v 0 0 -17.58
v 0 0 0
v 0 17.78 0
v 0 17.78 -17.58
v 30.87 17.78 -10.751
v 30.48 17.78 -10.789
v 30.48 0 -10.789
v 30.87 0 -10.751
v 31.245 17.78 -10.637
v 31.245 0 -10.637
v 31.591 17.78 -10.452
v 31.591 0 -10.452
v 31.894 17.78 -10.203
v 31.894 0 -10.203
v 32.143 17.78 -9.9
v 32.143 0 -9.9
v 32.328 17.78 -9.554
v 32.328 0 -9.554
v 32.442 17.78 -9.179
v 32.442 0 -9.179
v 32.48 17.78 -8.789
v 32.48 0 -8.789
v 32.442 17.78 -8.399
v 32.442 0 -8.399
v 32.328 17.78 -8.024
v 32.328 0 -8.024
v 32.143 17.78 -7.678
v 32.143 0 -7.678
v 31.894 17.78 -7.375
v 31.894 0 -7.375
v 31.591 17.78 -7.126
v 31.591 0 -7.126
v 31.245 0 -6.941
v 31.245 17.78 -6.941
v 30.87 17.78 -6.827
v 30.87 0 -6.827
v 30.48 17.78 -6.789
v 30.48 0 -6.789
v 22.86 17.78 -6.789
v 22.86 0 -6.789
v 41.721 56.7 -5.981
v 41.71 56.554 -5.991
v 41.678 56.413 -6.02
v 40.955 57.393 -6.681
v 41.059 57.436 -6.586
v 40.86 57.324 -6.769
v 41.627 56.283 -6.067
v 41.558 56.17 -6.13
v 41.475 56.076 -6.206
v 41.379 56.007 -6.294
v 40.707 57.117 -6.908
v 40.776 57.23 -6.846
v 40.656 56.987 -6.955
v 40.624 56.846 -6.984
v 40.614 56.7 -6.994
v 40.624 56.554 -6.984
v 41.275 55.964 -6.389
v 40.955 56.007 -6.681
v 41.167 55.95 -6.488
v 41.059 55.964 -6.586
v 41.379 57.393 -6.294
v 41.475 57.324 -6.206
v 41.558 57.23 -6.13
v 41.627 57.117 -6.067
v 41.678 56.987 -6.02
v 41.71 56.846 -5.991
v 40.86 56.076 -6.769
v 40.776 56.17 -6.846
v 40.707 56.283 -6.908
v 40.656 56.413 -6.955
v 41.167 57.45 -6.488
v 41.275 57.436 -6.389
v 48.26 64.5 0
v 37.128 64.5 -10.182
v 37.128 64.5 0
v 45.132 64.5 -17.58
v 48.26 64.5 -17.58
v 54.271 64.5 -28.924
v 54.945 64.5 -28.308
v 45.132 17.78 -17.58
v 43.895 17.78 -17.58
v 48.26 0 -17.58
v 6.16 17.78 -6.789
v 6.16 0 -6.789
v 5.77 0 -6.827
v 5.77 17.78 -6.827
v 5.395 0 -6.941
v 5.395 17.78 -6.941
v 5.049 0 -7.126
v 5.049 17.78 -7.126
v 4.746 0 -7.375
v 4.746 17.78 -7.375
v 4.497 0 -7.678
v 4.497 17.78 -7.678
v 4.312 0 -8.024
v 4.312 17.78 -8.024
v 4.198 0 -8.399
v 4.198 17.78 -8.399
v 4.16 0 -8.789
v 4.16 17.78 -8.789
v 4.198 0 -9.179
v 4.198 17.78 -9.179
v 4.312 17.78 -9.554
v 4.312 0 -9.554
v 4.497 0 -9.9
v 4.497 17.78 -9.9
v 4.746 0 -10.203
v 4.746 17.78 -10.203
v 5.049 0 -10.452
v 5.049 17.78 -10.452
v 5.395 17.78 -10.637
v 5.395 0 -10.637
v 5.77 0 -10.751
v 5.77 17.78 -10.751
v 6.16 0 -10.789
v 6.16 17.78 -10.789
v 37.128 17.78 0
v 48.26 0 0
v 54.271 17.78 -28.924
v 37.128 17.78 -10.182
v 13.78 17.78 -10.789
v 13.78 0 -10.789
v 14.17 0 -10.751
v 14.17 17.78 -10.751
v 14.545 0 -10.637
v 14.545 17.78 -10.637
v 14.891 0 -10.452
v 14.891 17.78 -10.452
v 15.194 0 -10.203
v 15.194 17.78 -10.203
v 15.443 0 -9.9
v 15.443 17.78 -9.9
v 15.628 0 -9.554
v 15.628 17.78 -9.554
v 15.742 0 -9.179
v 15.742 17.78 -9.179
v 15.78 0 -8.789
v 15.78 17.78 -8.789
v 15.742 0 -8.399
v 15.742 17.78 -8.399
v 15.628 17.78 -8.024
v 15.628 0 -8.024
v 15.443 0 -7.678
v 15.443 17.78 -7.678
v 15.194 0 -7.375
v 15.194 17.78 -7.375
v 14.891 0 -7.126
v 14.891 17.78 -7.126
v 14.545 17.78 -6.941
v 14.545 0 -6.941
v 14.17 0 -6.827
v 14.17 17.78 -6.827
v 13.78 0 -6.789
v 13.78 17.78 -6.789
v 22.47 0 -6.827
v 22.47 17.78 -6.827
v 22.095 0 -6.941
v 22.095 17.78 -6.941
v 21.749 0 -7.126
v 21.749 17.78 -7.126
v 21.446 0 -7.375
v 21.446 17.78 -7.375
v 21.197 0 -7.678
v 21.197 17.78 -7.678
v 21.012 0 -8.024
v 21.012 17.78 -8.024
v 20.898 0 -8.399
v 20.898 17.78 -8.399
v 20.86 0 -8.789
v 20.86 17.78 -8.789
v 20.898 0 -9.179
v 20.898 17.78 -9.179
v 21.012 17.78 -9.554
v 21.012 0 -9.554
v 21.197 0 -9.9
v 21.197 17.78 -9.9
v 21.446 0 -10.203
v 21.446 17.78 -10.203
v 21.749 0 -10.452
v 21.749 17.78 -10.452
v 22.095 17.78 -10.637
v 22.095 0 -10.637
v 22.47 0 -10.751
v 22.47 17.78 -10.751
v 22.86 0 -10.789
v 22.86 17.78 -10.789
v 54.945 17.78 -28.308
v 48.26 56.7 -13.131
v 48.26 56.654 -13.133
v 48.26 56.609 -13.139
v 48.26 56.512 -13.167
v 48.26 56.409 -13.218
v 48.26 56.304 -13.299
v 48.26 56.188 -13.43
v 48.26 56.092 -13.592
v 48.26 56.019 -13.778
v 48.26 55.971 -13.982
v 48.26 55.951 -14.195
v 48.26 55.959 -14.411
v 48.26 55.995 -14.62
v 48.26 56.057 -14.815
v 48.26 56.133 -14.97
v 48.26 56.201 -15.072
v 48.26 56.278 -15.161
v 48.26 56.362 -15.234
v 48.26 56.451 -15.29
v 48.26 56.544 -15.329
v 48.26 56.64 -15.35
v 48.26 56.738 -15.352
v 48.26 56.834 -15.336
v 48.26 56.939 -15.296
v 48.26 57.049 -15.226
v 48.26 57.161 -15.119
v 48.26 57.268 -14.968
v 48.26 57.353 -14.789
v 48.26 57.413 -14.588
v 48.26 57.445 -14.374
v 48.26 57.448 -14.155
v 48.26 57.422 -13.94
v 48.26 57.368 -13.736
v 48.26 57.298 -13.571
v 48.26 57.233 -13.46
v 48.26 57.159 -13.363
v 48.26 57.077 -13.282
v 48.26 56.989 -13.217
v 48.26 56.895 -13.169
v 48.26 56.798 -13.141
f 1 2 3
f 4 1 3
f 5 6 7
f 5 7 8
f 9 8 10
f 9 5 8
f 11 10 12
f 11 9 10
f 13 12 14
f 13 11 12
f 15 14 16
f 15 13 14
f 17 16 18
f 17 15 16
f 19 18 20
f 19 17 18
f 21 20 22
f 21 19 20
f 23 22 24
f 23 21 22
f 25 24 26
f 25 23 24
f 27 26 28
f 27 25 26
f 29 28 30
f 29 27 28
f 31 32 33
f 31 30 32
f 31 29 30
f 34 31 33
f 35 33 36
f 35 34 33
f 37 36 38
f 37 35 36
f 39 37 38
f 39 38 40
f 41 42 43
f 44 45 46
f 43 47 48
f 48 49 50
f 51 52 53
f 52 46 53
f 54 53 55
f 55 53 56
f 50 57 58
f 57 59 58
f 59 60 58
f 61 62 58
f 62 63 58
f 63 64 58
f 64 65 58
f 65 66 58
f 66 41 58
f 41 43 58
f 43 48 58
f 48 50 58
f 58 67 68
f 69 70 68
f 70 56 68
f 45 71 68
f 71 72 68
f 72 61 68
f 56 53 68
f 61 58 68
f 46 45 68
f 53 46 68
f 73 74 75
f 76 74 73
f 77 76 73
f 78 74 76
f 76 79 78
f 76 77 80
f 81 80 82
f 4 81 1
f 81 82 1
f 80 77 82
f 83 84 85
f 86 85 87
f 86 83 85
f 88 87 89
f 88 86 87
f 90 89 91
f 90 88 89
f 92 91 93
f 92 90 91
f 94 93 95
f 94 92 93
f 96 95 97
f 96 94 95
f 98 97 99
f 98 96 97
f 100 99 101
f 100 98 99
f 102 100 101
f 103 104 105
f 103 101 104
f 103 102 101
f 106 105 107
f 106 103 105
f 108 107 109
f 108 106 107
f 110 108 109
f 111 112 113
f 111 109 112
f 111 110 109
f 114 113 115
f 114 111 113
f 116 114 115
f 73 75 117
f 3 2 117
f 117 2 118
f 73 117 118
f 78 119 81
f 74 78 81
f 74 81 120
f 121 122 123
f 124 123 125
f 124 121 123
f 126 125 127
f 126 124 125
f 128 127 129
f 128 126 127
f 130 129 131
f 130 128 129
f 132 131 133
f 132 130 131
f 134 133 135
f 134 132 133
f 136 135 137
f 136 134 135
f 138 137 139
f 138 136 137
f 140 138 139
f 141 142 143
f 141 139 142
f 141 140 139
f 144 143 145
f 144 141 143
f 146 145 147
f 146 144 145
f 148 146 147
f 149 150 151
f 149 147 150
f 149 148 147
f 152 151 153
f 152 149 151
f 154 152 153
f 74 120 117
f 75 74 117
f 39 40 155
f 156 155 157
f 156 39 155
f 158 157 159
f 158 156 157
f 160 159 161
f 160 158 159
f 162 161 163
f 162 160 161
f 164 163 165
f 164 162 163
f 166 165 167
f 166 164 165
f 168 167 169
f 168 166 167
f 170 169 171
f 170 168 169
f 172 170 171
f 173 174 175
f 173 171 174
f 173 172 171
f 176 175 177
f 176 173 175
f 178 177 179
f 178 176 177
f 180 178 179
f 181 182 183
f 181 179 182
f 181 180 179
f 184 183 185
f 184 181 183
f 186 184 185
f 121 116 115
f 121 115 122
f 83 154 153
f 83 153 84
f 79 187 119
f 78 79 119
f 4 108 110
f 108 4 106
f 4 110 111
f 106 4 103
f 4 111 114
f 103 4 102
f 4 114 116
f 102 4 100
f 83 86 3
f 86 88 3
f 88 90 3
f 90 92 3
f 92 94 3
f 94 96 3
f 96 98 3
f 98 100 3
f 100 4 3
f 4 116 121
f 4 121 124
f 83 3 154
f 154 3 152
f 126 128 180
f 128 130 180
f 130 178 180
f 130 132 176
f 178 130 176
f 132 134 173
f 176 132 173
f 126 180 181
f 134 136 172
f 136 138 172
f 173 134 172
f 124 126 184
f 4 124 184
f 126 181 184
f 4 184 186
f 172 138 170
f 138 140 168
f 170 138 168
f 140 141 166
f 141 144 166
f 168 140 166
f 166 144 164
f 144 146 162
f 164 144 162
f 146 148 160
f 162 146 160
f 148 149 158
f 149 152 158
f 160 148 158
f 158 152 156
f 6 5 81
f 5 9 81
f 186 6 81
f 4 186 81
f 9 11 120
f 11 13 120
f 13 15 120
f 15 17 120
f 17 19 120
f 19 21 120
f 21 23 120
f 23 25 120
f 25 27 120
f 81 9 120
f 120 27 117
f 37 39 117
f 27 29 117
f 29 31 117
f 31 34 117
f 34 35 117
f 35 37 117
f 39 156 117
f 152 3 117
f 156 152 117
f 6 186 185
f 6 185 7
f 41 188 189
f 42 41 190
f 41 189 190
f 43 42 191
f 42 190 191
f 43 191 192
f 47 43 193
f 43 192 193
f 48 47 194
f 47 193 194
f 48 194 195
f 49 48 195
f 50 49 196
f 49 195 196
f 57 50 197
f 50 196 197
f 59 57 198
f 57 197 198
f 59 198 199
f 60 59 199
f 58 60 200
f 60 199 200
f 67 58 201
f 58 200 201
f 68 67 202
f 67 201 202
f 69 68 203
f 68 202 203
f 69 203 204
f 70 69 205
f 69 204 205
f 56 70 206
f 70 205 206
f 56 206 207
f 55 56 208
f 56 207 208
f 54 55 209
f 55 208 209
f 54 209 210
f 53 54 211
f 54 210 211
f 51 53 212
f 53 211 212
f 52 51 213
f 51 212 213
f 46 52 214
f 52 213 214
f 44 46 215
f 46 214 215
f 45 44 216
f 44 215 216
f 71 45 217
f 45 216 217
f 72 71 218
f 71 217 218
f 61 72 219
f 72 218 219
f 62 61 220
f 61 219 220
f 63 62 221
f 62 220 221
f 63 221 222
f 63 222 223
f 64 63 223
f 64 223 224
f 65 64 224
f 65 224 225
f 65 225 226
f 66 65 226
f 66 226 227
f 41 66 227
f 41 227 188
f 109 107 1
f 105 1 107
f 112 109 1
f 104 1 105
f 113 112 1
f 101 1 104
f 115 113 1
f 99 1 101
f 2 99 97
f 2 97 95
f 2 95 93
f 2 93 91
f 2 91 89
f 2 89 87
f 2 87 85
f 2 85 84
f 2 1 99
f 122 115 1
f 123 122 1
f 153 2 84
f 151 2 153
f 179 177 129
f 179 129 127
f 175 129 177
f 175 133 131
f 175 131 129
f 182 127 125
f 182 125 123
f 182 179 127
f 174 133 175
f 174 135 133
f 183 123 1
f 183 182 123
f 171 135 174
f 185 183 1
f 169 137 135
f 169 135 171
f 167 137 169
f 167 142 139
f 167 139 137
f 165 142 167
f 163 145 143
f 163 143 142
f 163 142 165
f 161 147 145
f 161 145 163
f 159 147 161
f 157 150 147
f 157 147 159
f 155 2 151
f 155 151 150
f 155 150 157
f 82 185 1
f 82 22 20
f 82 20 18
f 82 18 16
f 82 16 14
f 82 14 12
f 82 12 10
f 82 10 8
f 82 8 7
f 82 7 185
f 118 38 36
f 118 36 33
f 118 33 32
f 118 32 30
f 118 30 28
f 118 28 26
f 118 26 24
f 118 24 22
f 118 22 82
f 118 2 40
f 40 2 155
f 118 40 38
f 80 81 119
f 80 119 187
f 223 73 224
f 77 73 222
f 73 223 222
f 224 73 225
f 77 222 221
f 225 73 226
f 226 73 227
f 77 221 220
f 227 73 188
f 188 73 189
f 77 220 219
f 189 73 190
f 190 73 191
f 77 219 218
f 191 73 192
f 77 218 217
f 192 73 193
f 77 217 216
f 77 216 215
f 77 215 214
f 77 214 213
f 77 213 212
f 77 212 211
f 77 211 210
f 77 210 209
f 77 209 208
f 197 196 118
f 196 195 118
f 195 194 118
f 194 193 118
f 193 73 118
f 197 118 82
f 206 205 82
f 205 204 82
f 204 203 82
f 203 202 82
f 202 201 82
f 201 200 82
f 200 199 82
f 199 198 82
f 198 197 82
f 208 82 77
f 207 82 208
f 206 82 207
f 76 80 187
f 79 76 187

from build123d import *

# Parameters (mm, degrees)
SKETCH1_W           = 48.26
SKETCH1_H           = 17.78
BOSS_EXTRUDE1_DEPTH = 17.579999892
BOSS_EXTRUDE4_DEPTH = 46.720000032
CUT_EXTRUDE1_DEPTH  = 70.432286432
BOSS_EXTRUDE5_DEPTH = 46.72
SKETCH9_W           = 0.75
SKETCH9_H           = 25.854438162


with BuildPart() as part:
    # Sketch1 → Boss-Extrude1 (new body)
    with BuildSketch(Plane.XY):
        with Locations((24.13, 8.89)):
            Rectangle(SKETCH1_W, SKETCH1_H)
    extrude(amount=-BOSS_EXTRUDE1_DEPTH)

    # Sketch3 → Boss-Extrude4 (add)
    with BuildSketch(Plane(origin=(0, 17.78, 0), x_dir=(1, 0, 0), z_dir=(0, 1, 0))):
        Polygon((37.801769271, 9.565696577), (37.128446266, 10.181556346), (37.128446266, 0), (48.26, 0), (48.26, 13.587965792), (48.26, 17.579999892), (45.132109917, 17.579999892), align=None)
    extrude(amount=BOSS_EXTRUDE4_DEPTH)

    # Sketch4 → Cut-Extrude1 (cut, through all)
    with BuildSketch(Plane(origin=(0, 17.78, 0), x_dir=(1, 0, 0), z_dir=(0, 1, 0))):
        with BuildLine():
            Line((30.48, 6.789), (22.86, 6.789))
            ThreePointArc((22.86, 6.789), (20.86, 8.789), (22.86, 10.789))
            Line((22.86, 10.789), (30.48, 10.789))
            ThreePointArc((30.48, 10.789), (32.48, 8.789), (30.48, 6.789))
        make_face()
        with BuildLine():
            Line((13.78, 6.789), (6.16, 6.789))
            ThreePointArc((6.16, 6.789), (4.16, 8.789), (6.16, 10.789))
            Line((6.16, 10.789), (13.78, 10.789))
            ThreePointArc((13.78, 10.789), (15.78, 8.789), (13.78, 6.789))
        make_face()
    extrude(amount=-CUT_EXTRUDE1_DEPTH, mode=Mode.SUBTRACT)

    # Sketch3<7> → Boss-Extrude5 (add, through all)
    with BuildSketch(Plane(origin=(0, 17.78, 0), x_dir=(1, 0, 0), z_dir=(0, 1, 0))):
        Polygon((54.944699529, 28.308160187), (54.271376524, 28.924019957), (37.128446266, 10.181556346), (37.801769271, 9.565696577), align=None)
    extrude(amount=BOSS_EXTRUDE5_DEPTH)

    # Sketch9 → Ø1.5mm Dowel Hole1 (revolve, cut)
    with BuildSketch(Plane(origin=(41.16709667, 56.699990232, -6.487575467), x_dir=(0.7378922681206892, 0, 0.6749185140798146), z_dir=(0, 1, 0))):
        with Locations((0.375, 12.927219081)):
            Rectangle(SKETCH9_W, SKETCH9_H)
    revolve(axis=Axis((36.881364106, 56.699990232, -1.801959564), (0.6749185140798145, 0, -0.7378922681206892)), mode=Mode.SUBTRACT)


solid = part.part
